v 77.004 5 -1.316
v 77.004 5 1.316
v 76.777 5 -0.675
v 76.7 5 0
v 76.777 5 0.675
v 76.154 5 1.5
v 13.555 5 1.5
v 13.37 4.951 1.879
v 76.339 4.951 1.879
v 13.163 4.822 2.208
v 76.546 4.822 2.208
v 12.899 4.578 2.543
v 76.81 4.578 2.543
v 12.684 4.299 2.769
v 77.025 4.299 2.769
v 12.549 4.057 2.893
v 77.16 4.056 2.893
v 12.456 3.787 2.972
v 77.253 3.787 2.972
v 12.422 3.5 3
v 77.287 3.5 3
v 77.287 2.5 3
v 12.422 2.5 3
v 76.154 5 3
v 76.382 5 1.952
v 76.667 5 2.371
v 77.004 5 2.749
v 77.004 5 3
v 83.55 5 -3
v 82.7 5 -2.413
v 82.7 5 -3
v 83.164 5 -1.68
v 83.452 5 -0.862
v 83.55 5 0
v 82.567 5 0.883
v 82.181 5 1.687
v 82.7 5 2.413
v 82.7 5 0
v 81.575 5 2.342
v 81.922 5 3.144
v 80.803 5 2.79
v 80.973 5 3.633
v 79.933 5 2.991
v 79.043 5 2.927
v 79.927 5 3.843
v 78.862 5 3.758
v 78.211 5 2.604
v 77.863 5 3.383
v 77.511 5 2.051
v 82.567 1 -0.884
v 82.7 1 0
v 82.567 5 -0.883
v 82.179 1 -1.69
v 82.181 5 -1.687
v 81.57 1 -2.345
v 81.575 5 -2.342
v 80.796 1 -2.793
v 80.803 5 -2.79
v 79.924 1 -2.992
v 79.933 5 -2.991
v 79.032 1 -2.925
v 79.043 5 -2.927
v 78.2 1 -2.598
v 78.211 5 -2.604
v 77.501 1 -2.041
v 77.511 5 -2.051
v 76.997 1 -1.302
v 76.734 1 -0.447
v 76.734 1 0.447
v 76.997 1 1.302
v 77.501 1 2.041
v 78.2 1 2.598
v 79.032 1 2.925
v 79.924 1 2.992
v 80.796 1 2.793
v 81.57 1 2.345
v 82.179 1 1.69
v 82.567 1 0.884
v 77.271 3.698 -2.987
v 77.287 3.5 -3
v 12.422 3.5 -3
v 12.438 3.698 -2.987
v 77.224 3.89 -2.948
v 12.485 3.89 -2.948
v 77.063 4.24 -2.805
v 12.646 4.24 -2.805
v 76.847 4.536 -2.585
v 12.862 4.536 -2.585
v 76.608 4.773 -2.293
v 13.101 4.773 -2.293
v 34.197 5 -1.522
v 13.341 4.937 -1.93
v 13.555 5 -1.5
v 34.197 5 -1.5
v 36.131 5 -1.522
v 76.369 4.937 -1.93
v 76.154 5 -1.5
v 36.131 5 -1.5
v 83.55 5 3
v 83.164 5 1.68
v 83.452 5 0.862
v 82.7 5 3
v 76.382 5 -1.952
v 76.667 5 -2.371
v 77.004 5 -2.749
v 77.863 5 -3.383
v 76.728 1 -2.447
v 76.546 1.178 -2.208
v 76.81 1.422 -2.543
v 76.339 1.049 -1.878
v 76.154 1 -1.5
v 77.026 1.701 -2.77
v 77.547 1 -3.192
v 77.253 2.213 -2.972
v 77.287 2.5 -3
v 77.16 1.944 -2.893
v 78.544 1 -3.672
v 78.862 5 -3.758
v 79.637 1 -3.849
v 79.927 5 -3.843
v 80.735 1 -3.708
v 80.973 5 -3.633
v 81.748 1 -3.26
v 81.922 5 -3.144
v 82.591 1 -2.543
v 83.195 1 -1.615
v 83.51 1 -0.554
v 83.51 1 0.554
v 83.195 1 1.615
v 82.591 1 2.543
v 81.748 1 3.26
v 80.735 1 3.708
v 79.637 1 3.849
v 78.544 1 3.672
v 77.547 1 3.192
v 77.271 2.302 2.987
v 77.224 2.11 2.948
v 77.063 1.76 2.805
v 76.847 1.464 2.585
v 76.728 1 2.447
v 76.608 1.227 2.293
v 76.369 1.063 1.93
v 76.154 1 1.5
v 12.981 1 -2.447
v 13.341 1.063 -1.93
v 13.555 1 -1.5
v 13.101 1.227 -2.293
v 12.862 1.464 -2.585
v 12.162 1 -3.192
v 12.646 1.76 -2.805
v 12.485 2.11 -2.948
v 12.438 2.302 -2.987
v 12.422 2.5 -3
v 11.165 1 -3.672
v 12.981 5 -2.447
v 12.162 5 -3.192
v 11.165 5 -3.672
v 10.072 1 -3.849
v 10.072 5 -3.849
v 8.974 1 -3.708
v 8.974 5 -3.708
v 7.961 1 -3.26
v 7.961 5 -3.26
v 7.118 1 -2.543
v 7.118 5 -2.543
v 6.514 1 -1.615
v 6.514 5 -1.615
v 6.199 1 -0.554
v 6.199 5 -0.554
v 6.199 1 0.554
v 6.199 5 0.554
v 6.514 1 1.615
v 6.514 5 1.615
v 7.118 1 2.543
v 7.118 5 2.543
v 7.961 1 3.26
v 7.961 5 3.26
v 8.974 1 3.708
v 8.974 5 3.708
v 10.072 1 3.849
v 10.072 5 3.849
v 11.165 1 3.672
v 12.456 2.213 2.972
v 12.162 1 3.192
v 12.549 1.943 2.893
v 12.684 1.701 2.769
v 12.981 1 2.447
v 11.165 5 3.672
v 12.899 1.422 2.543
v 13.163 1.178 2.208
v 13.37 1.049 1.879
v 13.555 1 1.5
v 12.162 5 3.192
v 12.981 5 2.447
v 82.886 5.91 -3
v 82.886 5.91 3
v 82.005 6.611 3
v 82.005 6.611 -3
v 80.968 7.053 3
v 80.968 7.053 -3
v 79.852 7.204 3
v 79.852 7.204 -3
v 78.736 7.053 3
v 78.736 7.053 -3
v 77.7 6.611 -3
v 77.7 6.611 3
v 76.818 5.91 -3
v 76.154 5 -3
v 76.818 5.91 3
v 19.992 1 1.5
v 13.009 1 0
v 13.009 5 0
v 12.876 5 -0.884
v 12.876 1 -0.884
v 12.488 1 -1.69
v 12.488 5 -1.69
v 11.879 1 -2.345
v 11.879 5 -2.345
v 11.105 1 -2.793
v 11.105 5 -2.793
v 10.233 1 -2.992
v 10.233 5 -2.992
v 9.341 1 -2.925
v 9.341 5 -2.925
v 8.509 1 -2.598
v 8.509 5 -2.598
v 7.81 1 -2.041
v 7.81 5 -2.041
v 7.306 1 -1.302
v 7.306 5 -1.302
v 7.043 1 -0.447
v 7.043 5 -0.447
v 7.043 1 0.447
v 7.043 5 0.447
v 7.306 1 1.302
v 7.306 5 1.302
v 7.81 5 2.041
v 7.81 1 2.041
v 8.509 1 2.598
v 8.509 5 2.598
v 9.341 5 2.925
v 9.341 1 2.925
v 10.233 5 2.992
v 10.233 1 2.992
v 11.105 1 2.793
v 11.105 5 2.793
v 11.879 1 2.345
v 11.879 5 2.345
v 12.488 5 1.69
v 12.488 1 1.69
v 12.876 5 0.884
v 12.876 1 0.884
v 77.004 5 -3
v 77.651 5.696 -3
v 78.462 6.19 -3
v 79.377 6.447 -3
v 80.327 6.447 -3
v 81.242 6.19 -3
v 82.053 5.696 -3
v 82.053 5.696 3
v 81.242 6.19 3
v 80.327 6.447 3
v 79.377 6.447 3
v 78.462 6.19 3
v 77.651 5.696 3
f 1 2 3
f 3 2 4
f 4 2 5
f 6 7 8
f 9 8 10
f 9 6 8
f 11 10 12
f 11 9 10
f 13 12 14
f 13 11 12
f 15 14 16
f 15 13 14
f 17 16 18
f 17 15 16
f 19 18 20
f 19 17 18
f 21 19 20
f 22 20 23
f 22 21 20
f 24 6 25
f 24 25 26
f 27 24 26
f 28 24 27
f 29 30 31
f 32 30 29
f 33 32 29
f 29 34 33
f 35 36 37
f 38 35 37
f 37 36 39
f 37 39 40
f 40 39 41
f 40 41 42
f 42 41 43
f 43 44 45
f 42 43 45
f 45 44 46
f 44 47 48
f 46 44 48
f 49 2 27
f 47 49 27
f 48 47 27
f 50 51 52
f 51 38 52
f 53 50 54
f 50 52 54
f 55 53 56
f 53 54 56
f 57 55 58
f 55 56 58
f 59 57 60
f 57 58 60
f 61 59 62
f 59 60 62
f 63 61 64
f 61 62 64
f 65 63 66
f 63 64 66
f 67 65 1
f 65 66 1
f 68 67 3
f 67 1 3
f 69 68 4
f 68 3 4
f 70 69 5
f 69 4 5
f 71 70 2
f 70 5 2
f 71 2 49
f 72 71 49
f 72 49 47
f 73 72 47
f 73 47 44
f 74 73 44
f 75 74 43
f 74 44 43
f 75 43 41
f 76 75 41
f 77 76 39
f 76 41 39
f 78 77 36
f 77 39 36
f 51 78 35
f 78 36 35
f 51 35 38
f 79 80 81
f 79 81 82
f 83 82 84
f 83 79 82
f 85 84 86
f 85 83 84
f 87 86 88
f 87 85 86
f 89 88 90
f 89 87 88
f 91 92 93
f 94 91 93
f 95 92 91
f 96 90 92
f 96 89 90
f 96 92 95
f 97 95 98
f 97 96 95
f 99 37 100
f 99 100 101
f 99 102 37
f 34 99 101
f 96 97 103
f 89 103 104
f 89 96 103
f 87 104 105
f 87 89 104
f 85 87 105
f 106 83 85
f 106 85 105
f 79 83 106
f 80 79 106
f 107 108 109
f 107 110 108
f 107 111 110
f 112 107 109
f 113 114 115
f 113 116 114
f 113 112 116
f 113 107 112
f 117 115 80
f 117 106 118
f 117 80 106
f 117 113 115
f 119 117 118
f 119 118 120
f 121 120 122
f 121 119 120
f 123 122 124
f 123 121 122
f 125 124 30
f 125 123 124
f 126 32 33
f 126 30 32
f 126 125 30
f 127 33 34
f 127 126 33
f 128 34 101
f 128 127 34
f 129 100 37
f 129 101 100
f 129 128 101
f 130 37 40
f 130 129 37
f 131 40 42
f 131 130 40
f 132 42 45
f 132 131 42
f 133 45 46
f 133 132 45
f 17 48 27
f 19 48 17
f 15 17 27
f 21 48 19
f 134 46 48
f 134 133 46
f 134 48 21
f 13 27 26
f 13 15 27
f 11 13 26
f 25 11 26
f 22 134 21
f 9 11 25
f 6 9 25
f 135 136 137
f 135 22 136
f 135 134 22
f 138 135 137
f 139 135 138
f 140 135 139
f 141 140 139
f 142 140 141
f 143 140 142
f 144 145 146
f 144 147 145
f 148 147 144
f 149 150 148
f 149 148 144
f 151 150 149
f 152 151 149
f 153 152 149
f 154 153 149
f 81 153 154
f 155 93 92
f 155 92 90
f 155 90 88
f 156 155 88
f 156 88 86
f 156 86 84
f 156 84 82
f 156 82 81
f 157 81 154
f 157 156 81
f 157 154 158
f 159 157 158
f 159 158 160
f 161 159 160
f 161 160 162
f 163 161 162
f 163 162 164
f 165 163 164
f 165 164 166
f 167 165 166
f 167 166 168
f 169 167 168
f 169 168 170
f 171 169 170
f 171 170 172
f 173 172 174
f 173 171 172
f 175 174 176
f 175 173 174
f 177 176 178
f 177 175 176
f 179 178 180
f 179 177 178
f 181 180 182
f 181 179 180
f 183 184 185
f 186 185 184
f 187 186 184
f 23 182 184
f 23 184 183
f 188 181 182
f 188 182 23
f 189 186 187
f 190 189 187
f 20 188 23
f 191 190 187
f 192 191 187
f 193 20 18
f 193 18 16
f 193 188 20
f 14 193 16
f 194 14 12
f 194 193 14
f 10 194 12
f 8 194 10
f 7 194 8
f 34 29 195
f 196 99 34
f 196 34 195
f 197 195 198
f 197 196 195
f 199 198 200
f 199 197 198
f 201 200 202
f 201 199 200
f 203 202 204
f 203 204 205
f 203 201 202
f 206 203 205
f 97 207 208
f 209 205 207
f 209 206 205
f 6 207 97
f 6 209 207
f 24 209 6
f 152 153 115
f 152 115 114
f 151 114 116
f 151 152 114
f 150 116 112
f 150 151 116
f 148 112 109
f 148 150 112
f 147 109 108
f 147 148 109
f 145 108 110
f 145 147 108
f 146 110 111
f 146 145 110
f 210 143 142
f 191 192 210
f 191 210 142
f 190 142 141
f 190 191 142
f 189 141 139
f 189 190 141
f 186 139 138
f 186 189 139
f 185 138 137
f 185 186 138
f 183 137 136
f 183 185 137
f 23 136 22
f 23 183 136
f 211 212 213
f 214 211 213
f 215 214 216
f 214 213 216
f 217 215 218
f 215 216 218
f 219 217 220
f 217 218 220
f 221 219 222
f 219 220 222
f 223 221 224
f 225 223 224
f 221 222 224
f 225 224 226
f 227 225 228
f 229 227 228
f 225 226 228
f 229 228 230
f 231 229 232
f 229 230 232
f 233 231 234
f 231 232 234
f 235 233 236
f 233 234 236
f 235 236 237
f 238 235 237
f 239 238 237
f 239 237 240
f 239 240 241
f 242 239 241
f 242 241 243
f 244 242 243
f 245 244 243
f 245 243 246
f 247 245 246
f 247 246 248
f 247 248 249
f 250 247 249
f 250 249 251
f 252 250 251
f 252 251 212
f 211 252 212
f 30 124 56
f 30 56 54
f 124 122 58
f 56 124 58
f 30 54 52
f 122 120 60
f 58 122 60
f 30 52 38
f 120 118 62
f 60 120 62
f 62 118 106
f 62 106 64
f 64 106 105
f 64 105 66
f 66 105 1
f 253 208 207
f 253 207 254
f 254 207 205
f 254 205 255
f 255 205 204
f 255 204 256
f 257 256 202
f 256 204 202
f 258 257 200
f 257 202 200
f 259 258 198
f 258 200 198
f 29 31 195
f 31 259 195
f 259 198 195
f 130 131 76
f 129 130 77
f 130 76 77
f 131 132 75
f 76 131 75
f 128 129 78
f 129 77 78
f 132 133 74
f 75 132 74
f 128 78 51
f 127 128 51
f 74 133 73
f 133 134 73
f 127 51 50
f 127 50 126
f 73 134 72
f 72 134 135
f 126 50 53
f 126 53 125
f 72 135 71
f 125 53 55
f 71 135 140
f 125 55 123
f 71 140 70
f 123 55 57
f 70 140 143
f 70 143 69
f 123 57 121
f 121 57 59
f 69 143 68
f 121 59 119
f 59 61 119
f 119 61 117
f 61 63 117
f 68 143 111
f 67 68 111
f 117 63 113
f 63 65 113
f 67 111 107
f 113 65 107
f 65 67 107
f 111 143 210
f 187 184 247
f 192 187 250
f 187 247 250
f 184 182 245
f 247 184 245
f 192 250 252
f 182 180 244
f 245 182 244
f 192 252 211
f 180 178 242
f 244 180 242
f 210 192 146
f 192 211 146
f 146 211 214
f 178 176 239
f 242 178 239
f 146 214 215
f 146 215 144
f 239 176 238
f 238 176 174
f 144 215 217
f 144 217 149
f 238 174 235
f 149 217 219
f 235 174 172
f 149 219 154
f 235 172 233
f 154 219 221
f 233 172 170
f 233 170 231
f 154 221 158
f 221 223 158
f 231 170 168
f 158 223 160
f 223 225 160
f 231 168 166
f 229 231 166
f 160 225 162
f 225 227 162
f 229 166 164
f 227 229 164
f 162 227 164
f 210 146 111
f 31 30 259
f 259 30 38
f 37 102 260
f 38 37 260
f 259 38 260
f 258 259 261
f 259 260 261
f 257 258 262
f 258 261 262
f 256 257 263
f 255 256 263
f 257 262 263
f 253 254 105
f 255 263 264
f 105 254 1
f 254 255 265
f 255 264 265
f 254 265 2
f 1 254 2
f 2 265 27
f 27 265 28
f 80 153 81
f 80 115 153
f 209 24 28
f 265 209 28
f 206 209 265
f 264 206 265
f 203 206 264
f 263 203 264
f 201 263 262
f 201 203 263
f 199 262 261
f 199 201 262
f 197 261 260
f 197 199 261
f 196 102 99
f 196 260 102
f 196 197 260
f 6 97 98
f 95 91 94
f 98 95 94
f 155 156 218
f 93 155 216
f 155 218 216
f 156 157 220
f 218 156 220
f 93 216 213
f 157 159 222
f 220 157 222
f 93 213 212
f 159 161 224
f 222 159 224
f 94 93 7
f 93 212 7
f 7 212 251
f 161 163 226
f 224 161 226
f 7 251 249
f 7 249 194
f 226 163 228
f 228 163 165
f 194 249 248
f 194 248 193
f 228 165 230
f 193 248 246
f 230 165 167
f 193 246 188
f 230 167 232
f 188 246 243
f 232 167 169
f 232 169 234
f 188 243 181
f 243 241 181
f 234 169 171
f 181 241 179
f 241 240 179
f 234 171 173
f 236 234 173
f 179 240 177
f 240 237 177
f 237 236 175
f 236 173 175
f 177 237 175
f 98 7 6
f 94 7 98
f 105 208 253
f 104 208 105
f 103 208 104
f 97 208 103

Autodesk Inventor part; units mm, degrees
ref_plane "YZ Plane" through (0, 0, 0) normal (1, 0, 0) x (0, 1, 0)
ref_plane "XZ Plane" through (0, 0, 0) normal (0, 1, 0) x (-1, 0, 0)
ref_plane "XY Plane" through (0, 0, 0) normal (0, 0, 1) x (1, 0, 0)
sketch "Sketch1" plane through (0, 0, 0) normal (0, 1, 0) x (-1, 0, 0)
  point P0 (0, 0)
sketch "Sketch2" plane through (0, 0, 0) normal (0, 1, 0) x (-1, 0, 0)
  circle A0 centre (0, 0) radius 3.85
  dimension "d0" = 7.7
extrude "Extrusion1" add sketch "Sketch2" along normal blind 6
sketch "Sketch3" plane through (0, 6, 0) normal (0, 1, 0) x (1, 0, 0)
  circle A0 centre (0, 0) radius 1
  dimension "d3" = 2
extrude "Extrusion2" cut sketch "Sketch3" against normal through all
sketch "Sketch4" plane through (0, 0, 0) normal (0, -1, 0) x (1, 0, 0)
  circle A0 centre (0, 0) radius 3.85 projected
  line L0 (0, 3.85) -> (3.85, 3.85)
  line L1 (3.85, 3.85) -> (3.85, -3.85)
  line L2 (3.85, -3.85) -> (0, -3.85)
  line L3 (3.85, 3.85) -> (4.85, 3.85)
  line L4 (4.85, 3.85) -> (4.85, -3.85)
  line L5 (4.85, -3.85) -> (3.85, -3.85)
  line L6 (3.85, -3.85) -> (3.85, 3.85)
  line L7 (4.85, 3.85) -> (4.85, 3)
  line L8 (4.85, -3.85) -> (4.85, -3)
  line L9 (4.85, 3) -> (3.85, 3)
  line L10 (3.85, 3) -> (3.85, -3)
  line L11 (3.85, -3) -> (4.85, -3)
  line L12 (4.85, -3) -> (4.85, 3)
  point P0 (3.85, -3)
  dimension "d6" = 1
  dimension "d7" = 0.85
  dimension "d8" = 0.85
extrude "Extrusion3" add sketch "Sketch4" against normal blind 6 contours L1 L9 L4 L11
sketch "Sketch5" plane through (4.85, 0, 3) normal (1, 0, 0) x (0, 0, -1)
  line L0 (6.85, 0) -> (-0.85, 0) projected
  line L1 (6, 0) -> (6, 6) projected
  line L2 (0.0003, 0) -> (6, 0)
  line L3 (6, 0) -> (6, 1)
  line L4 (6, 1) -> (0.0003, 1)
  line L5 (0.0003, 1) -> (0.0003, 0)
  line L6 (6.85, 6) -> (-0.85, 6) projected
  line L7 (0.0003, 6) -> (6, 6)
  line L8 (6, 6) -> (6, 5)
  line L9 (6, 5) -> (0.0003, 5)
  line L10 (0.0003, 5) -> (0.0003, 6)
  point P0 (3, 0)
  point P1 (3, 6)
  dimension "d11" = 1
  dimension "d12" = 1
extrude "Extrusion4" cut sketch "Sketch5" against normal blind 1 contours L9 L10 L6 L1
extrude "Extrusion5" cut sketch "Sketch5" against normal blind 1 contours L0 L5 L4 L1
sketch "Sketch6" plane through (4.85, 5, 2.9997) normal (0, 0, -1) x (-1, 0, 0)
  line L0 (0, 0) -> (1, 0) projected
  line L1 (0, -5) -> (0, 1) projected
  line L2 (1, 0) -> (0, 0)
  line L3 (0, 0) -> (0, 1)
  line L4 (0, 1) -> (1, 1)
  line L5 (1, 1) -> (1, 0)
  line L6 (1, -5) -> (0, -5)
  line L7 (0, -5) -> (0, -3.9916)
  line L8 (0, -3.9916) -> (1, -3.9916)
  line L9 (1, -3.9916) -> (1, -5)
  point P0 (4.85, -5)
extrude "Extrusion6" cut sketch "Sketch6" against normal through all contours L1 L4 L5 L0
extrude "Extrusion7" cut sketch "Sketch6" against normal through all contours L1 L8 L9 L6
sketch "Sketch7" plane through (4.85, 5, 3) normal (1, 0, 0) x (0, 0, -1)
  line L0 (0, 0) -> (3, 0) projected
  line L1 (6, -4) -> (6, 0) projected
  line L2 (0, 0) -> (6, 0)
  line L3 (6, 0) -> (6, -4)
  line L4 (6, -4) -> (0, -4)
  line L5 (0, -4) -> (0, 0)
  point P0 (3, -5)
extrude "Extrusion8" add sketch "Sketch7" along normal blind 71
sketch "Sketch8" plane through (3.85, 1, -3) normal (0, 0, -1) x (-1, 0, 0)
  point P0 (3.85, -1)
sketch "Sketch9" plane through (3.85, 5, 0) normal (0, 1, 0) x (1, 0, 0)
  line L0 (72, 3) -> (72, -3) projected
  line L1 (72, 0) -> (75.85, 0)
  circle A0 centre (75.85, 0) radius 3.85
  point P0 (-3.85, 0)
  dimension "d23" = 3.85
extrude "Extrusion9" add sketch "Sketch9" along normal blind 1
extrude "Extrusion10" add sketch "Sketch9" against normal blind 5
sketch "Sketch10" plane through (79.7, 6, 0) normal (0, 1, 0) x (1, 0, 0)
  circle A0 centre (0, 0) radius 1.85
  point P0 (-79.7, 0)
  dimension "d28" = 3.7
extrude "Extrusion11" cut sketch "Sketch10" against normal through all
sketch "Sketch11" plane through (3.85, 5, 0) normal (-1, 0, 0) x (0, 0, 1)
  point P0 (0, -5)
sketch "Sketch12" plane through (3.85, 5, -3) normal (-1, 0, 0) x (0, 0, 1)
  line L0 (0, 0) -> (3, 0) projected
  line L1 (6, 0) -> (6, -4) projected
  line L2 (0, 0) -> (6, 0)
  line L3 (6, 0) -> (6, -4)
  line L4 (6, -4) -> (0, -4)
  line L5 (0, -4) -> (0, 0)
  point P0 (3, -5)
extrude "Extrusion12" add sketch "Sketch12" along normal blind 2
sketch "Sketch13" plane through (75.85, 5, 3) normal (1, 0, 0) x (0, 0, -1)
  line L0 (3, 0) -> (0, 0) projected
  line L1 (3, -4) -> (6, -4) projected
  line L2 (0, 0) -> (6, 0)
  line L3 (6, 0) -> (6, -4)
  line L4 (6, -4) -> (0, -4)
  line L5 (0, -4) -> (0, 0)
  point P0 (3, -5)
extrude "Extrusion13" add sketch "Sketch13" along normal blind 1.6
fillet "Fillet1" radius 1.5 2 edges at (76.5685, 5, 3) (39.1315, 5, 3)
fillet "Fillet2" radius 1.5 1 edges at (39.85, 5, -3)
fillet "Fillet3" radius 1.5 1 edges at (39.85, 1, -3)
fillet "Fillet4" radius 1.5 3 edges at (4.35, 1, 2.9997) (40.35, 1, 3) (4.85, 1, 2.9998)
sketch "Sketch14" plane through (3.5458, 5, 1.5) normal (0, 1, 0) x (1, 0, 0)
  point P0 (-3.5458, 1.5)
sketch "Sketch15" plane through (3.5458, 5, 1.5) normal (0, 1, 0) x (1, 0, 0)
  line L0 (0.4177, 2.9988) -> (2.9717, 2.9988) construction
  line L1 (2.9717, 2.9988) -> (2.9717, -0.0492) construction
  line L2 (2.9717, -0.0492) -> (0.4177, -0.0492) construction
  line L3 (0.4177, -0.0492) -> (0.4177, 2.9988) construction
  line L4 (0.398, -0.0492) -> (1.4255, 2.9988)
  line L5 (1.4255, 2.9988) -> (1.9244, 2.9988)
  line L6 (1.9244, 2.9988) -> (2.952, -0.0492)
  line L7 (2.952, -0.0492) -> (2.5247, -0.0492)
  line L8 (2.5247, -0.0492) -> (2.248, 0.803)
  line L9 (2.248, 0.803) -> (1.0846, 0.803)
  line L10 (1.0846, 0.803) -> (0.808, -0.0492)
  line L11 (0.808, -0.0492) -> (0.398, -0.0492)
  line L12 (2.1369, 1.1488) -> (1.6651, 2.5839)
  line L13 (1.6651, 2.5839) -> (1.1958, 1.1488)
  line L14 (1.1958, 1.1488) -> (2.1369, 1.1488)
  point P0 (-3.5458, 1.5)
extrude "Extrusion14" add sketch "Sketch15" along normal blind 0.2
sketch "Sketch16" plane through (3.5458, 5, -1.5) normal (0, 1, 0) x (1, 0, 0)
  line L0 (69.8363, -0.0038) -> (72.3064, -0.0038) construction
  line L1 (72.3064, -0.0038) -> (72.3064, -3.0518) construction
  line L2 (72.3064, -3.0518) -> (69.8363, -3.0518) construction
  line L3 (69.8363, -3.0518) -> (69.8363, -0.0038) construction
  spline S0 degree 2 poles (72.2125, -2.1157) (72.2125, -2.3429) (72.0396, -2.6912) (71.8963, -2.8048) knots 0 0 0 1 2 2 2
  spline S1 degree 2 poles (71.8963, -2.8048) (71.7234, -2.9382) (71.3307, -3.0518) (71.0195, -3.0518) knots 0 0 0 1 2 2 2
  line L4 (71.0195, -3.0518) -> (70.1451, -3.0518)
  line L5 (70.1451, -3.0518) -> (70.1451, -0.0038)
  line L6 (70.1451, -0.0038) -> (70.9528, -0.0038)
  spline S2 degree 2 poles (70.9528, -0.0038) (71.2788, -0.0038) (71.6049, -0.0458) (71.7531, -0.1273) knots 0 0 0 1 2 2 2
  spline S3 degree 2 poles (71.7531, -0.1273) (71.9186, -0.2138) (72.0692, -0.4978) (72.0692, -0.6905) knots 0 0 0 1 2 2 2
  spline S4 degree 2 poles (72.0692, -0.6905) (72.0692, -0.9054) (71.842, -1.2462) (71.6419, -1.3426) knots 0 0 0 1 2 2 2
  line L7 (71.6419, -1.3426) -> (71.6419, -1.3574)
  spline S5 degree 2 poles (71.6419, -1.3574) (71.9136, -1.4315) (72.2125, -1.8242) (72.2125, -2.1157) knots 0 0 0 1 2 2 2
  spline S6 degree 2 poles (71.7901, -2.133) (71.7901, -1.9601) (71.6913, -1.7378) (71.5431, -1.6587) knots 0 0 0 1 2 2 2
  spline S7 degree 2 poles (71.5431, -1.6587) (71.4468, -1.6093) (71.2195, -1.5797) (71.0096, -1.5797) knots 0 0 0 1 2 2 2
  line L8 (71.0096, -1.5797) -> (70.5502, -1.5797)
  line L9 (70.5502, -1.5797) -> (70.5502, -2.706)
  line L10 (70.5502, -2.706) -> (70.8787, -2.706)
  spline S8 degree 2 poles (70.8787, -2.706) (71.1454, -2.706) (71.4517, -2.6566) (71.5703, -2.5776) knots 0 0 0 1 2 2 2
  spline S9 degree 2 poles (71.5703, -2.5776) (71.6839, -2.4961) (71.7901, -2.2935) (71.7901, -2.133) knots 0 0 0 1 2 2 2
  spline S10 degree 2 poles (71.6469, -0.7473) (71.6469, -0.6386) (71.5728, -0.4756) (71.4912, -0.4287) knots 0 0 0 1 2 2 2
  spline S11 degree 2 poles (71.4912, -0.4287) (71.3924, -0.3743) (71.1529, -0.3496) (70.938, -0.3496) knots 0 0 0 1 2 2 2
  line L11 (70.938, -0.3496) -> (70.5502, -0.3496)
  line L12 (70.5502, -0.3496) -> (70.5502, -1.2413)
  line L13 (70.5502, -1.2413) -> (71.0096, -1.2413)
  spline S12 degree 2 poles (71.0096, -1.2413) (71.1998, -1.2413) (71.3801, -1.2018) (71.4764, -1.14) knots 0 0 0 1 2 2 2
  spline S13 degree 2 poles (71.4764, -1.14) (71.5703, -1.0807) (71.6469, -0.8905) (71.6469, -0.7473) knots 0 0 0 1 2 2 2
  point P0 (-3.5458, -1.5)
extrude "Extrusion15" add sketch "Sketch16" along normal blind 0.2
sketch "Sketch17" plane through (3.5458, 5, -1.5) normal (0, 1, 0) x (1, 0, 0)
  line L0 (0.4145, -1.5) -> (36.4145, -1.5)
  line L1 (30.4487, 0.0859) -> (55.6072, 0.0859) construction
  line L2 (55.6072, 0.0859) -> (55.6072, -2.5363) construction
  line L3 (55.6072, -2.5363) -> (30.4487, -2.5363) construction
  line L4 (30.4487, -2.5363) -> (30.4487, 0.0859) construction
  line L5 (32.5853, -0.4353) -> (31.2663, -3.0264)
  line L6 (31.2663, -3.0264) -> (30.8316, -3.0264)
  line L7 (30.8316, -3.0264) -> (32.2247, -0.3365)
  line L8 (32.2247, -0.3365) -> (30.6513, -0.3365)
  line L9 (30.6513, -0.3365) -> (30.6513, 0.0216)
  line L10 (30.6513, 0.0216) -> (32.5853, 0.0216)
  line L11 (32.5853, 0.0216) -> (32.5853, -0.4353)
  line L12 (34.838, -3.0264) -> (32.9583, -3.0264)
  line L13 (32.9583, -3.0264) -> (32.9583, -2.5941)
  spline S0 degree 2 poles (32.9583, -2.5941) (33.1608, -2.4039) (33.5214, -2.0507) (33.6943, -1.8605) knots 0 0 0 1 2 2 2
  spline S1 degree 2 poles (33.6943, -1.8605) (34.0426, -1.4777) (34.297, -1.0182) (34.297, -0.7737) knots 0 0 0 1 2 2 2
  spline S2 degree 2 poles (34.297, -0.7737) (34.297, -0.6453) (34.218, -0.4526) (34.1464, -0.3909) knots 0 0 0 1 2 2 2
  spline S3 degree 2 poles (34.1464, -0.3909) (34.0747, -0.3291) (33.887, -0.2674) (33.7734, -0.2674) knots 0 0 0 1 2 2 2
  spline S4 degree 2 poles (33.7734, -0.2674) (33.6647, -0.2674) (33.4424, -0.3217) (33.3411, -0.3637) knots 0 0 0 1 2 2 2
  spline S5 degree 2 poles (33.3411, -0.3637) (33.2547, -0.3983) (33.0941, -0.4971) (33.0447, -0.5317) knots 0 0 0 1 2 2 2
  line L14 (33.0447, -0.5317) -> (33.0225, -0.5317)
  line L15 (33.0225, -0.5317) -> (33.0225, -0.0969)
  spline S6 degree 2 poles (33.0225, -0.0969) (33.1485, -0.0352) (33.6005, 0.0859) (33.803, 0.0859) knots 0 0 0 1 2 2 2
  spline S7 degree 2 poles (33.803, 0.0859) (34.2303, 0.0859) (34.712, -0.3662) (34.712, -0.7515) knots 0 0 0 1 2 2 2
  spline S8 degree 2 poles (34.712, -0.7515) (34.712, -0.9318) (34.628, -1.2331) (34.5539, -1.3616) knots 0 0 0 1 2 2 2
  spline S9 degree 2 poles (34.5539, -1.3616) (34.4798, -1.495) (34.2649, -1.7568) (34.1464, -1.8828) knots 0 0 0 1 2 2 2
  spline S10 degree 2 poles (34.1464, -1.8828) (33.9537, -2.0927) (33.4819, -2.5422) (33.3411, -2.6732) knots 0 0 0 1 2 2 2
  line L16 (33.3411, -2.6732) -> (34.838, -2.6732)
  line L17 (34.838, -2.6732) -> (34.838, -3.0264)
  line L18 (37.8958, -3.0264) -> (37.8958, -1.7024)
  spline S11 degree 2 poles (37.8958, -1.7024) (37.8958, -1.5444) (37.8711, -1.2751) (37.8316, -1.201) knots 0 0 0 1 2 2 2
  spline S12 degree 2 poles (37.8316, -1.201) (37.7921, -1.1195) (37.6414, -1.0405) (37.5105, -1.0405) knots 0 0 0 1 2 2 2
  spline S13 degree 2 poles (37.5105, -1.0405) (37.392, -1.0405) (37.1203, -1.1862) (36.977, -1.3245) knots 0 0 0 1 2 2 2
  spline S14 degree 2 poles (36.977, -1.3245) (36.9795, -1.3591) (36.9844, -1.4554) (36.9844, -1.5197) knots 0 0 0 1 2 2 2
  line L19 (36.9844, -1.5197) -> (36.9844, -3.0264)
  line L20 (36.9844, -3.0264) -> (36.5991, -3.0264)
  line L21 (36.5991, -3.0264) -> (36.5991, -1.7024)
  spline S15 degree 2 poles (36.5991, -1.7024) (36.5991, -1.5444) (36.5744, -1.2751) (36.5349, -1.201) knots 0 0 0 1 2 2 2
  spline S16 degree 2 poles (36.5349, -1.201) (36.4953, -1.1195) (36.3447, -1.0405) (36.2138, -1.0405) knots 0 0 0 1 2 2 2
  spline S17 degree 2 poles (36.2138, -1.0405) (36.0903, -1.0405) (35.8161, -1.1961) (35.6876, -1.3171) knots 0 0 0 1 2 2 2
  line L22 (35.6876, -1.3171) -> (35.6876, -3.0264)
  line L23 (35.6876, -3.0264) -> (35.3023, -3.0264)
  line L24 (35.3023, -3.0264) -> (35.3023, -0.7391)
  line L25 (35.3023, -0.7391) -> (35.6876, -0.7391)
  line L26 (35.6876, -0.7391) -> (35.6876, -0.9911)
  spline S18 degree 2 poles (35.6876, -0.9911) (35.8383, -0.8404) (36.1347, -0.6749) (36.3126, -0.6749) knots 0 0 0 1 2 2 2
  spline S19 degree 2 poles (36.3126, -0.6749) (36.5151, -0.6749) (36.8288, -0.8602) (36.9103, -1.0701) knots 0 0 0 1 2 2 2
  spline S20 degree 2 poles (36.9103, -1.0701) (37.0857, -0.875) (37.4167, -0.6749) (37.6093, -0.6749) knots 0 0 0 1 2 2 2
  spline S21 degree 2 poles (37.6093, -0.6749) (37.7575, -0.6749) (37.9996, -0.7663) (38.0885, -0.87) knots 0 0 0 1 2 2 2
  spline S22 degree 2 poles (38.0885, -0.87) (38.1799, -0.9738) (38.2812, -1.285) (38.2812, -1.5197) knots 0 0 0 1 2 2 2
  line L27 (38.2812, -1.5197) -> (38.2812, -3.0264)
  line L28 (38.2812, -3.0264) -> (37.8958, -3.0264)
  line L29 (41.4156, -3.0264) -> (41.4156, -1.7024)
  spline S23 degree 2 poles (41.4156, -1.7024) (41.4156, -1.5444) (41.3909, -1.2751) (41.3514, -1.201) knots 0 0 0 1 2 2 2
  spline S24 degree 2 poles (41.3514, -1.201) (41.3119, -1.1195) (41.1612, -1.0405) (41.0303, -1.0405) knots 0 0 0 1 2 2 2
  spline S25 degree 2 poles (41.0303, -1.0405) (40.9117, -1.0405) (40.64, -1.1862) (40.4968, -1.3245) knots 0 0 0 1 2 2 2
  spline S26 degree 2 poles (40.4968, -1.3245) (40.4992, -1.3591) (40.5042, -1.4554) (40.5042, -1.5197) knots 0 0 0 1 2 2 2
  line L30 (40.5042, -1.5197) -> (40.5042, -3.0264)
  line L31 (40.5042, -3.0264) -> (40.1189, -3.0264)
  line L32 (40.1189, -3.0264) -> (40.1189, -1.7024)
  spline S27 degree 2 poles (40.1189, -1.7024) (40.1189, -1.5444) (40.0942, -1.2751) (40.0546, -1.201) knots 0 0 0 1 2 2 2
  spline S28 degree 2 poles (40.0546, -1.201) (40.0151, -1.1195) (39.8644, -1.0405) (39.7335, -1.0405) knots 0 0 0 1 2 2 2
  spline S29 degree 2 poles (39.7335, -1.0405) (39.61, -1.0405) (39.3359, -1.1961) (39.2074, -1.3171) knots 0 0 0 1 2 2 2
  line L33 (39.2074, -1.3171) -> (39.2074, -3.0264)
  line L34 (39.2074, -3.0264) -> (38.8221, -3.0264)
  line L35 (38.8221, -3.0264) -> (38.8221, -0.7391)
  line L36 (38.8221, -0.7391) -> (39.2074, -0.7391)
  line L37 (39.2074, -0.7391) -> (39.2074, -0.9911)
  spline S30 degree 2 poles (39.2074, -0.9911) (39.3581, -0.8404) (39.6545, -0.6749) (39.8323, -0.6749) knots 0 0 0 1 2 2 2
  spline S31 degree 2 poles (39.8323, -0.6749) (40.0349, -0.6749) (40.3486, -0.8602) (40.4301, -1.0701) knots 0 0 0 1 2 2 2
  spline S32 degree 2 poles (40.4301, -1.0701) (40.6054, -0.875) (40.9364, -0.6749) (41.1291, -0.6749) knots 0 0 0 1 2 2 2
  spline S33 degree 2 poles (41.1291, -0.6749) (41.2773, -0.6749) (41.5194, -0.7663) (41.6083, -0.87) knots 0 0 0 1 2 2 2
  spline S34 degree 2 poles (41.6083, -0.87) (41.6997, -0.9738) (41.8009, -1.285) (41.8009, -1.5197) knots 0 0 0 1 2 2 2
  line L38 (41.8009, -1.5197) -> (41.8009, -3.0264)
  line L39 (41.8009, -3.0264) -> (41.4156, -3.0264)
  point P0 (-3.5458, -1.5)
  dimension "d43" = 36
extrude "Extrusion16" add sketch "Sketch17" along normal blind 0.2
sketch "Sketch18" plane through (3.5458, 5.2, -1.5) normal (0, 1, 0) x (1, 0, 0)
  line L0 (29.8828, 2.0952) -> (43.3392, 2.0952)
  line L1 (43.3392, 2.0952) -> (43.3392, -5.5663)
  line L2 (43.3392, -5.5663) -> (29.8828, -5.5663)
  line L3 (29.8828, -5.5663) -> (29.8828, 2.0952)
  point P0 (-3.5458, -1.5)
extrude "Extrusion17" cut sketch "Sketch18" against normal blind 0.2
sketch "Sketch19" plane through (3.5458, 5.2, 1.5) normal (0, 1, 0) x (1, 0, 0)
  line L0 (0.3624, -0.1736) -> (3.3783, -0.1736)
  line L1 (3.3783, -0.1736) -> (3.3783, 3.2897)
  line L2 (3.3783, 3.2897) -> (0.3624, 3.2897)
  line L3 (0.3624, 3.2897) -> (0.3624, -0.1736)
  line L4 (72.2697, -0.5369) -> (69.8008, -0.5369)
  line L5 (69.8008, -0.5369) -> (69.8008, 3.7021)
  line L6 (69.8008, 3.7021) -> (72.2697, 3.7021)
  line L7 (72.2697, 3.7021) -> (72.2697, -0.5369)
  point P0 (-3.5458, 1.5)
extrude "Extrusion18" cut sketch "Sketch19" against normal blind 0.2 contours L3 L2 L1 L0
extrude "Extrusion19" cut sketch "Sketch19" against normal blind 0.2 contours L4 L5 L6 L7
sketch "Sketch20" plane through (79.7, 0, 0) normal (0, -1, 0) x (1, 0, 0)
  point P0 (-79.7, 0)
sketch "Sketch21" plane through (79.7, 6, 0) normal (0, 1, 0) x (1, 0, 0)
  circle A0 centre (0, 0) radius 1.95
  point P0 (-79.7, 0)
  dimension "d52" = 3.9
extrude "Extrusion20" cut sketch "Sketch21" against normal through all
sketch "Sketch22" plane through (0, 6, 0) normal (0, 1, 0) x (1, 0, 0)
  line L0 (0, 0) -> (0, -3.85)
  circle A0 centre (0, 0) radius 3.85 projected
  line L1 (0, -3.85) -> (3.85, -3.85)
  line L2 (3.85, -3.85) -> (-3.85, -3.85)
  line L3 (-3.85, -3.85) -> (-3.85, 3.85)
  line L4 (-3.85, 3.85) -> (3.85, 3.85)
  line L5 (3.85, 3.85) -> (3.85, -3.85)
extrude "Extrusion21" cut sketch "Sketch22" against normal through all contours A0
sketch "Sketch23" plane through (79.7, 5, 0) normal (0, 1, 0) x (1, 0, 0)
  arc A0 (-76.1542, -1.5) -> (-76.1542, 1.5) centre (-79.7, 0) ccw projected
  line L0 (-75.85, 0) -> (-77.9753, 0)
  line L1 (-77.9753, 0) -> (-77.9753, 3.5992)
  line L2 (-77.9753, 3.5992) -> (-75.85, 3.5992)
  line L3 (-75.85, 3.5992) -> (-75.85, 0)
  line L4 (-75.85, 0) -> (-77.9753, 0)
  line L5 (-77.9753, 0) -> (-77.9753, -3.4561)
  line L6 (-77.9753, -3.4561) -> (-75.85, -3.4561)
  line L7 (-75.85, -3.4561) -> (-75.85, 0)
  line L8 (-75.85, -3.4561) -> (-65.85, -3.4561)
  line L9 (-65.85, -3.4561) -> (-65.85, 3.5992)
  line L10 (-65.85, 3.5992) -> (-75.85, 3.5992)
  line L11 (-75.85, 3.5992) -> (-75.85, -3.4561)
  dimension "d57" = 10
extrude "Extrusion22" cut sketch "Sketch23" against normal through all contours L3 L10 L9 L8 L7
extrude "Extrusion23" cut sketch "Sketch23" against normal through all contours L7 L6 L5 L0
extrude "Extrusion24" cut sketch "Sketch23" against normal through all contours L0 L1 L2 L3
sketch "Sketch24" plane through (13.85, 5, -1.5) normal (-1, 0, 0) x (0, 0, 1)
  line L0 (-2.9013, -5) -> (5.7799, -5)
  line L1 (5.7799, -5) -> (5.7799, 1.344)
  line L2 (5.7799, 1.344) -> (-2.9013, 1.344)
  line L3 (-2.9013, 1.344) -> (-2.9013, -5)
  point P0 (1.5, -5)
extrude "Extrusion25" cut sketch "Sketch24" against normal blind 6.142
sketch "Sketch25" plane through (19.992, 5, -1.5) normal (-1, 0, 0) x (0, 0, 1)
  line L0 (-1.5, 0) -> (4.5, 0)
  line L1 (4.5, 0) -> (4.5, -4)
  line L2 (4.5, -4) -> (-1.5, -4)
  line L3 (-1.5, -4) -> (-1.5, 0)
  point P0 (1.5, -5)
  dimension "d66" = 6
  dimension "d67" = 4
extrude "Extrusion26" add sketch "Sketch25" along normal blind 6.133
sketch "Sketch26" plane through (79.7, 6, 0) normal (0, 1, 0) x (1, 0, 0)
  line L0 (-65.841, -3) -> (-65.841, 3) projected
  line L1 (-65.841, 0) -> (-69.691, 0)
  circle A0 centre (-69.691, 0) radius 3.85
  point P0 (-79.7, 0)
  dimension "d70" = 3.85
extrude "Extrusion27" add sketch "Sketch26" against normal blind 6
sketch "Sketch27" plane through (13.859, 5, -1.5) normal (-1, 0, 0) x (0, 0, 1)
  point P0 (1.5, -5)
sketch "Sketch28" plane through (13.859, 5, -1.5) normal (-1, 0, 0) x (0, 0, 1)
  line L0 (-1.5, 0) -> (-1.5, -4) projected
  line L1 (4.5, 0) -> (3, 0) projected
  line L2 (-1.5, -4) -> (4.5, -4)
  line L3 (4.5, -4) -> (4.5, 0)
  line L4 (4.5, 0) -> (-1.5, 0)
  line L5 (-1.5, 0) -> (-1.5, -4)
  point P0 (1.5, -5)
extrude "Extrusion28" add sketch "Sketch28" along normal blind 5
sketch "Sketch29" plane through (19.992, 3.5, 3) normal (0, 0, 1) x (1, 0, 0)
  point P0 (-19.992, -3.5)
sketch "Sketch30" plane through (79.7, 5, 0) normal (0, 1, 0) x (1, 0, 0)
  point P0 (-79.7, 0)
sketch "Sketch31" plane through (19.992, 5, -1.5) normal (1, 0, 0) x (0, 0, -1)
  arc A0 (-3, 0) -> (-4.5, -1.5) centre (-3, -1.5) ccw projected
  circle A1 centre (-3, -1.5) radius 1.5
  circle A2 centre (-3, -1.5) radius 1.5
  arc A3 (-4.5, -2.5) -> (-3, -4) centre (-3, -2.5) ccw projected
  circle A4 centre (-3, -2.5) radius 1.5
  arc A5 (0, -4) -> (1.5, -2.5) centre (0, -2.5) ccw projected
  circle A6 centre (0, -2.5) radius 1.5
  arc A7 (1.5, -1.5) -> (0, 0) centre (0, -1.5) ccw projected
  circle A8 centre (0, -1.5) radius 1.5
  line L0 (-4.5, -1.5) -> (-4.5, 0) projected
  line L1 (-4.5, 0) -> (-3, 0)
  line L2 (-3, 0) -> (-3, -1.5)
  line L3 (-3, -1.5) -> (-4.5, -1.5)
  line L4 (-4.5, -1.5) -> (-4.5, 0)
  line L5 (0, 0) -> (1.5, 0)
  line L6 (1.5, 0) -> (1.5, -1.5)
  line L7 (1.5, -1.5) -> (0, -1.5)
  line L8 (0, -1.5) -> (0, 0)
  line L9 (-3, -4) -> (-4.5, -4)
  line L10 (-4.5, -4) -> (-4.5, -2.5)
  line L11 (-4.5, -2.5) -> (-3, -2.5)
  line L12 (-3, -2.5) -> (-3, -4)
  line L13 (0, -4) -> (1.5, -4)
  line L14 (1.5, -4) -> (1.5, -2.5)
  line L15 (1.5, -2.5) -> (0, -2.5)
  line L16 (0, -2.5) -> (0, -4)
  point P0 (-1.5, -5)
extrude "Extrusion29" cut sketch "Sketch31" against normal blind 10 contours A0 L0 L1
extrude "Extrusion30" cut sketch "Sketch31" against normal blind 10 contours A3 L9 L10
extrude "Extrusion31" cut sketch "Sketch31" against normal blind 10 contours A5 L14 L13
extrude "Extrusion32" cut sketch "Sketch31" against normal blind 10 contours L5 L6 A7
sketch "Sketch32" plane through (79.7, 6, 0) normal (0, 1, 0) x (1, 0, 0)
  point P0 (-79.7, 0)
sketch "Sketch33" plane through (10.009, 6, 0) normal (0, 1, 0) x (1, 0, 0)
  circle A0 centre (0, 0) radius 3.85
  point P0 (-10.009, 0)
extrude "Extrusion33" add sketch "Sketch33" against normal blind 6
sketch "Sketch34" plane through (10.009, 6, 0) normal (0, 1, 0) x (1, 0, 0)
  circle A0 centre (0, 0) radius 1.925
  point P0 (-10.009, 0)
  dimension "d85" = 3.85
extrude "Extrusion34" cut sketch "Sketch34" against normal blind 6
sketch "Sketch35" plane through (10.009, 6, 0) normal (0, 1, 0) x (1, 0, 0)
  point P0 (-10.009, 0)
sketch "Sketch36" plane through (79.7, 6, 0) normal (0, 1, 0) x (1, 0, 0)
  point P0 (-79.7, 0)
sketch "Sketch37" plane through (79.7, 6, 0) normal (0, 1, 0) x (1, 0, 0)
  point P0 (-79.7, 0)
sketch "Sketch38" plane through (10.009, 6, 0) normal (0, 1, 0) x (1, 0, 0)
  circle A0 centre (0, 0) radius 1.95
  point P0 (-10.009, 0)
  dimension "d89" = 3.9
extrude "Extrusion35" cut sketch "Sketch38" against normal blind 6
sketch "Sketch39" plane through (79.7, 6, 0) normal (0, 1, 0) x (1, 0, 0)
  point P0 (-79.7, 0)
sketch "Sketch40" plane through (79.7, 6, 0) normal (0, 1, 0) x (1, 0, 0)
  point P0 (-79.7, 0)
sketch "Sketch41" plane through (79.7, 6, 0) normal (0, 1, 0) x (1, 0, 0)
  point P0 (-79.7, 0)
sketch "Sketch42" plane through (79.7, 6, 0) normal (0, 1, 0) x (1, 0, 0)
  circle A0 centre (0, 0) radius 3
  arc A1 (-66.1452, -1.5) -> (-66.1452, 1.5) centre (-69.691, 0) ccw projected
  circle A2 centre (-69.691, 0) radius 3
  point P0 (-79.7, 0)
  dimension "d92" = 6
  dimension "d93" = 6
extrude "Extrusion36" cut sketch "Sketch42" against normal through all contours A0
extrude "Extrusion37" cut sketch "Sketch42" against normal through all contours A2
sketch "Sketch43" plane through (10.009, 0, 0) normal (0, -1, 0) x (1, 0, 0)
  circle A0 centre (0, 0) radius 3.85 projected
  line L0 (0, 3.85) -> (-5, 3.85)
  line L1 (-5, 3.85) -> (-5, -3.85)
  line L2 (-5, -3.85) -> (0, -3.85)
  line L3 (0, -3.85) -> (0, 3.85)
  line L4 (-5, 3.85) -> (-4.5, 3.85)
  line L5 (-4.5, 3.85) -> (-4.5, -3.85)
  line L6 (-4.5, -3.85) -> (-5, -3.85)
  line L7 (-5, -3.85) -> (-5, 3.85)
  point P0 (-10.009, 0)
  dimension "d98" = 5
  dimension "d99" = 0.5
extrude "Extrusion38" add sketch "Sketch43" against normal blind 1 contours L5 L2 L1 L0
sketch "Sketch44" plane through (5.009, 0, -3.85) normal (-1, 0, 0) x (0, 0, 1)
  point P0 (3.85, 0)
sketch "Sketch45" plane through (5.009, 0, -3.85) normal (-1, 0, 0) x (0, 0, 1)
  line L0 (7.7, 1) -> (0, 1) projected
  line L1 (0, 0) -> (7.7, 0) projected
  line L2 (0, 1) -> (7.7, 1)
  line L3 (7.7, 1) -> (7.7, 0)
  line L4 (7.7, 0) -> (0, 0)
  line L5 (0, 0) -> (0, 1)
  point P0 (3.85, 0)
extrude "Extrusion39" cut sketch "Sketch45" against normal through all
sketch "Sketch46" plane through (10.009, 6, 0) normal (0, 1, 0) x (1, 0, 0)
  circle A0 centre (0, 0) radius 3.85 projected
  line L0 (0, 3.85) -> (-5, 3.85)
  line L1 (-5, 3.85) -> (-5, -3.85)
  line L2 (-5, -3.85) -> (0, -3.85)
  line L3 (0, -3.85) -> (0, 3.85)
  line L4 (-5, 3.85) -> (-4.5, 3.85)
  line L5 (-4.5, 3.85) -> (-4.5, -3.85)
  line L6 (-4.5, -3.85) -> (-5, -3.85)
  line L7 (-5, -3.85) -> (-5, 3.85)
  point P0 (-10.009, 0)
  dimension "d104" = 5
  dimension "d105" = 0.5
extrude "Extrusion40" add sketch "Sketch46" against normal blind 1 contours L5 L2 L1 L0
sketch "Sketch47" plane through (5.009, 6, -3.85) normal (-1, 0, 0) x (0, 0, 1)
  line L0 (0, 0) -> (0, -1) projected
  line L1 (0, -1) -> (7.7, -1) projected
  line L2 (0, 0) -> (7.7, 0)
  line L3 (7.7, 0) -> (7.7, -1)
  line L4 (7.7, -1) -> (0, -1)
  line L5 (0, -1) -> (0, 0)
  point P0 (3.85, -6)
extrude "Extrusion41" cut sketch "Sketch47" against normal through all
sketch "Sketch48" plane through (12.422, 2.5, 3) normal (0, 0, 1) x (1, 0, 0)
  line L0 (1.1328, 2.5) -> (63.7322, 2.5) projected
  line L1 (1.1328, -1.5) -> (63.7322, -1.5) projected
  line L2 (63.7322, 2.5) -> (63.7322, -1.5)
  line L3 (63.7322, 2.5) -> (71.128, 2.5) projected
  line L4 (71.128, 2.5) -> (63.7322, -1.5)
  line L5 (63.7322, 2.5) -> (71.128, -1.5)
  line L6 (71.128, -1.5) -> (71.128, 2.5) projected
  circle A0 centre (67.4301, 0.5) radius 4.2041
  line L7 (67.4301, 0.5) -> (67.4301, -1.5)
  line L8 (64.278, -1.5) -> (70.278, -1.5) projected
  line L9 (70.278, 2.5) -> (70.278, -1.5) projected
  line L10 (71.128, 0.6263) -> (70.278, 0.6263)
  line L11 (63.7322, 0.5) -> (64.5822, 0.5)
  line L12 (64.5822, 2.5) -> (64.5822, -1.5)
  line L13 (70.278, 2.5) -> (70.278, -1.5)
  line L14 (64.5822, 2.5) -> (70.278, -1.5)
  line L15 (70.278, 2.5) -> (64.5822, -1.5)
  circle A1 centre (67.4301, 0.5) radius 3.48
  line L16 (63.7322, 2.5) -> (71.128, 2.5)
  point P0 (-12.422, -2.5)
  dimension "d110" = 4
  dimension "d111" = 0.85
extrude "Extrusion42" add sketch "Sketch48" against normal blind 6 contours A0 L3 A1
properties part number "Part3_3DPrint"
